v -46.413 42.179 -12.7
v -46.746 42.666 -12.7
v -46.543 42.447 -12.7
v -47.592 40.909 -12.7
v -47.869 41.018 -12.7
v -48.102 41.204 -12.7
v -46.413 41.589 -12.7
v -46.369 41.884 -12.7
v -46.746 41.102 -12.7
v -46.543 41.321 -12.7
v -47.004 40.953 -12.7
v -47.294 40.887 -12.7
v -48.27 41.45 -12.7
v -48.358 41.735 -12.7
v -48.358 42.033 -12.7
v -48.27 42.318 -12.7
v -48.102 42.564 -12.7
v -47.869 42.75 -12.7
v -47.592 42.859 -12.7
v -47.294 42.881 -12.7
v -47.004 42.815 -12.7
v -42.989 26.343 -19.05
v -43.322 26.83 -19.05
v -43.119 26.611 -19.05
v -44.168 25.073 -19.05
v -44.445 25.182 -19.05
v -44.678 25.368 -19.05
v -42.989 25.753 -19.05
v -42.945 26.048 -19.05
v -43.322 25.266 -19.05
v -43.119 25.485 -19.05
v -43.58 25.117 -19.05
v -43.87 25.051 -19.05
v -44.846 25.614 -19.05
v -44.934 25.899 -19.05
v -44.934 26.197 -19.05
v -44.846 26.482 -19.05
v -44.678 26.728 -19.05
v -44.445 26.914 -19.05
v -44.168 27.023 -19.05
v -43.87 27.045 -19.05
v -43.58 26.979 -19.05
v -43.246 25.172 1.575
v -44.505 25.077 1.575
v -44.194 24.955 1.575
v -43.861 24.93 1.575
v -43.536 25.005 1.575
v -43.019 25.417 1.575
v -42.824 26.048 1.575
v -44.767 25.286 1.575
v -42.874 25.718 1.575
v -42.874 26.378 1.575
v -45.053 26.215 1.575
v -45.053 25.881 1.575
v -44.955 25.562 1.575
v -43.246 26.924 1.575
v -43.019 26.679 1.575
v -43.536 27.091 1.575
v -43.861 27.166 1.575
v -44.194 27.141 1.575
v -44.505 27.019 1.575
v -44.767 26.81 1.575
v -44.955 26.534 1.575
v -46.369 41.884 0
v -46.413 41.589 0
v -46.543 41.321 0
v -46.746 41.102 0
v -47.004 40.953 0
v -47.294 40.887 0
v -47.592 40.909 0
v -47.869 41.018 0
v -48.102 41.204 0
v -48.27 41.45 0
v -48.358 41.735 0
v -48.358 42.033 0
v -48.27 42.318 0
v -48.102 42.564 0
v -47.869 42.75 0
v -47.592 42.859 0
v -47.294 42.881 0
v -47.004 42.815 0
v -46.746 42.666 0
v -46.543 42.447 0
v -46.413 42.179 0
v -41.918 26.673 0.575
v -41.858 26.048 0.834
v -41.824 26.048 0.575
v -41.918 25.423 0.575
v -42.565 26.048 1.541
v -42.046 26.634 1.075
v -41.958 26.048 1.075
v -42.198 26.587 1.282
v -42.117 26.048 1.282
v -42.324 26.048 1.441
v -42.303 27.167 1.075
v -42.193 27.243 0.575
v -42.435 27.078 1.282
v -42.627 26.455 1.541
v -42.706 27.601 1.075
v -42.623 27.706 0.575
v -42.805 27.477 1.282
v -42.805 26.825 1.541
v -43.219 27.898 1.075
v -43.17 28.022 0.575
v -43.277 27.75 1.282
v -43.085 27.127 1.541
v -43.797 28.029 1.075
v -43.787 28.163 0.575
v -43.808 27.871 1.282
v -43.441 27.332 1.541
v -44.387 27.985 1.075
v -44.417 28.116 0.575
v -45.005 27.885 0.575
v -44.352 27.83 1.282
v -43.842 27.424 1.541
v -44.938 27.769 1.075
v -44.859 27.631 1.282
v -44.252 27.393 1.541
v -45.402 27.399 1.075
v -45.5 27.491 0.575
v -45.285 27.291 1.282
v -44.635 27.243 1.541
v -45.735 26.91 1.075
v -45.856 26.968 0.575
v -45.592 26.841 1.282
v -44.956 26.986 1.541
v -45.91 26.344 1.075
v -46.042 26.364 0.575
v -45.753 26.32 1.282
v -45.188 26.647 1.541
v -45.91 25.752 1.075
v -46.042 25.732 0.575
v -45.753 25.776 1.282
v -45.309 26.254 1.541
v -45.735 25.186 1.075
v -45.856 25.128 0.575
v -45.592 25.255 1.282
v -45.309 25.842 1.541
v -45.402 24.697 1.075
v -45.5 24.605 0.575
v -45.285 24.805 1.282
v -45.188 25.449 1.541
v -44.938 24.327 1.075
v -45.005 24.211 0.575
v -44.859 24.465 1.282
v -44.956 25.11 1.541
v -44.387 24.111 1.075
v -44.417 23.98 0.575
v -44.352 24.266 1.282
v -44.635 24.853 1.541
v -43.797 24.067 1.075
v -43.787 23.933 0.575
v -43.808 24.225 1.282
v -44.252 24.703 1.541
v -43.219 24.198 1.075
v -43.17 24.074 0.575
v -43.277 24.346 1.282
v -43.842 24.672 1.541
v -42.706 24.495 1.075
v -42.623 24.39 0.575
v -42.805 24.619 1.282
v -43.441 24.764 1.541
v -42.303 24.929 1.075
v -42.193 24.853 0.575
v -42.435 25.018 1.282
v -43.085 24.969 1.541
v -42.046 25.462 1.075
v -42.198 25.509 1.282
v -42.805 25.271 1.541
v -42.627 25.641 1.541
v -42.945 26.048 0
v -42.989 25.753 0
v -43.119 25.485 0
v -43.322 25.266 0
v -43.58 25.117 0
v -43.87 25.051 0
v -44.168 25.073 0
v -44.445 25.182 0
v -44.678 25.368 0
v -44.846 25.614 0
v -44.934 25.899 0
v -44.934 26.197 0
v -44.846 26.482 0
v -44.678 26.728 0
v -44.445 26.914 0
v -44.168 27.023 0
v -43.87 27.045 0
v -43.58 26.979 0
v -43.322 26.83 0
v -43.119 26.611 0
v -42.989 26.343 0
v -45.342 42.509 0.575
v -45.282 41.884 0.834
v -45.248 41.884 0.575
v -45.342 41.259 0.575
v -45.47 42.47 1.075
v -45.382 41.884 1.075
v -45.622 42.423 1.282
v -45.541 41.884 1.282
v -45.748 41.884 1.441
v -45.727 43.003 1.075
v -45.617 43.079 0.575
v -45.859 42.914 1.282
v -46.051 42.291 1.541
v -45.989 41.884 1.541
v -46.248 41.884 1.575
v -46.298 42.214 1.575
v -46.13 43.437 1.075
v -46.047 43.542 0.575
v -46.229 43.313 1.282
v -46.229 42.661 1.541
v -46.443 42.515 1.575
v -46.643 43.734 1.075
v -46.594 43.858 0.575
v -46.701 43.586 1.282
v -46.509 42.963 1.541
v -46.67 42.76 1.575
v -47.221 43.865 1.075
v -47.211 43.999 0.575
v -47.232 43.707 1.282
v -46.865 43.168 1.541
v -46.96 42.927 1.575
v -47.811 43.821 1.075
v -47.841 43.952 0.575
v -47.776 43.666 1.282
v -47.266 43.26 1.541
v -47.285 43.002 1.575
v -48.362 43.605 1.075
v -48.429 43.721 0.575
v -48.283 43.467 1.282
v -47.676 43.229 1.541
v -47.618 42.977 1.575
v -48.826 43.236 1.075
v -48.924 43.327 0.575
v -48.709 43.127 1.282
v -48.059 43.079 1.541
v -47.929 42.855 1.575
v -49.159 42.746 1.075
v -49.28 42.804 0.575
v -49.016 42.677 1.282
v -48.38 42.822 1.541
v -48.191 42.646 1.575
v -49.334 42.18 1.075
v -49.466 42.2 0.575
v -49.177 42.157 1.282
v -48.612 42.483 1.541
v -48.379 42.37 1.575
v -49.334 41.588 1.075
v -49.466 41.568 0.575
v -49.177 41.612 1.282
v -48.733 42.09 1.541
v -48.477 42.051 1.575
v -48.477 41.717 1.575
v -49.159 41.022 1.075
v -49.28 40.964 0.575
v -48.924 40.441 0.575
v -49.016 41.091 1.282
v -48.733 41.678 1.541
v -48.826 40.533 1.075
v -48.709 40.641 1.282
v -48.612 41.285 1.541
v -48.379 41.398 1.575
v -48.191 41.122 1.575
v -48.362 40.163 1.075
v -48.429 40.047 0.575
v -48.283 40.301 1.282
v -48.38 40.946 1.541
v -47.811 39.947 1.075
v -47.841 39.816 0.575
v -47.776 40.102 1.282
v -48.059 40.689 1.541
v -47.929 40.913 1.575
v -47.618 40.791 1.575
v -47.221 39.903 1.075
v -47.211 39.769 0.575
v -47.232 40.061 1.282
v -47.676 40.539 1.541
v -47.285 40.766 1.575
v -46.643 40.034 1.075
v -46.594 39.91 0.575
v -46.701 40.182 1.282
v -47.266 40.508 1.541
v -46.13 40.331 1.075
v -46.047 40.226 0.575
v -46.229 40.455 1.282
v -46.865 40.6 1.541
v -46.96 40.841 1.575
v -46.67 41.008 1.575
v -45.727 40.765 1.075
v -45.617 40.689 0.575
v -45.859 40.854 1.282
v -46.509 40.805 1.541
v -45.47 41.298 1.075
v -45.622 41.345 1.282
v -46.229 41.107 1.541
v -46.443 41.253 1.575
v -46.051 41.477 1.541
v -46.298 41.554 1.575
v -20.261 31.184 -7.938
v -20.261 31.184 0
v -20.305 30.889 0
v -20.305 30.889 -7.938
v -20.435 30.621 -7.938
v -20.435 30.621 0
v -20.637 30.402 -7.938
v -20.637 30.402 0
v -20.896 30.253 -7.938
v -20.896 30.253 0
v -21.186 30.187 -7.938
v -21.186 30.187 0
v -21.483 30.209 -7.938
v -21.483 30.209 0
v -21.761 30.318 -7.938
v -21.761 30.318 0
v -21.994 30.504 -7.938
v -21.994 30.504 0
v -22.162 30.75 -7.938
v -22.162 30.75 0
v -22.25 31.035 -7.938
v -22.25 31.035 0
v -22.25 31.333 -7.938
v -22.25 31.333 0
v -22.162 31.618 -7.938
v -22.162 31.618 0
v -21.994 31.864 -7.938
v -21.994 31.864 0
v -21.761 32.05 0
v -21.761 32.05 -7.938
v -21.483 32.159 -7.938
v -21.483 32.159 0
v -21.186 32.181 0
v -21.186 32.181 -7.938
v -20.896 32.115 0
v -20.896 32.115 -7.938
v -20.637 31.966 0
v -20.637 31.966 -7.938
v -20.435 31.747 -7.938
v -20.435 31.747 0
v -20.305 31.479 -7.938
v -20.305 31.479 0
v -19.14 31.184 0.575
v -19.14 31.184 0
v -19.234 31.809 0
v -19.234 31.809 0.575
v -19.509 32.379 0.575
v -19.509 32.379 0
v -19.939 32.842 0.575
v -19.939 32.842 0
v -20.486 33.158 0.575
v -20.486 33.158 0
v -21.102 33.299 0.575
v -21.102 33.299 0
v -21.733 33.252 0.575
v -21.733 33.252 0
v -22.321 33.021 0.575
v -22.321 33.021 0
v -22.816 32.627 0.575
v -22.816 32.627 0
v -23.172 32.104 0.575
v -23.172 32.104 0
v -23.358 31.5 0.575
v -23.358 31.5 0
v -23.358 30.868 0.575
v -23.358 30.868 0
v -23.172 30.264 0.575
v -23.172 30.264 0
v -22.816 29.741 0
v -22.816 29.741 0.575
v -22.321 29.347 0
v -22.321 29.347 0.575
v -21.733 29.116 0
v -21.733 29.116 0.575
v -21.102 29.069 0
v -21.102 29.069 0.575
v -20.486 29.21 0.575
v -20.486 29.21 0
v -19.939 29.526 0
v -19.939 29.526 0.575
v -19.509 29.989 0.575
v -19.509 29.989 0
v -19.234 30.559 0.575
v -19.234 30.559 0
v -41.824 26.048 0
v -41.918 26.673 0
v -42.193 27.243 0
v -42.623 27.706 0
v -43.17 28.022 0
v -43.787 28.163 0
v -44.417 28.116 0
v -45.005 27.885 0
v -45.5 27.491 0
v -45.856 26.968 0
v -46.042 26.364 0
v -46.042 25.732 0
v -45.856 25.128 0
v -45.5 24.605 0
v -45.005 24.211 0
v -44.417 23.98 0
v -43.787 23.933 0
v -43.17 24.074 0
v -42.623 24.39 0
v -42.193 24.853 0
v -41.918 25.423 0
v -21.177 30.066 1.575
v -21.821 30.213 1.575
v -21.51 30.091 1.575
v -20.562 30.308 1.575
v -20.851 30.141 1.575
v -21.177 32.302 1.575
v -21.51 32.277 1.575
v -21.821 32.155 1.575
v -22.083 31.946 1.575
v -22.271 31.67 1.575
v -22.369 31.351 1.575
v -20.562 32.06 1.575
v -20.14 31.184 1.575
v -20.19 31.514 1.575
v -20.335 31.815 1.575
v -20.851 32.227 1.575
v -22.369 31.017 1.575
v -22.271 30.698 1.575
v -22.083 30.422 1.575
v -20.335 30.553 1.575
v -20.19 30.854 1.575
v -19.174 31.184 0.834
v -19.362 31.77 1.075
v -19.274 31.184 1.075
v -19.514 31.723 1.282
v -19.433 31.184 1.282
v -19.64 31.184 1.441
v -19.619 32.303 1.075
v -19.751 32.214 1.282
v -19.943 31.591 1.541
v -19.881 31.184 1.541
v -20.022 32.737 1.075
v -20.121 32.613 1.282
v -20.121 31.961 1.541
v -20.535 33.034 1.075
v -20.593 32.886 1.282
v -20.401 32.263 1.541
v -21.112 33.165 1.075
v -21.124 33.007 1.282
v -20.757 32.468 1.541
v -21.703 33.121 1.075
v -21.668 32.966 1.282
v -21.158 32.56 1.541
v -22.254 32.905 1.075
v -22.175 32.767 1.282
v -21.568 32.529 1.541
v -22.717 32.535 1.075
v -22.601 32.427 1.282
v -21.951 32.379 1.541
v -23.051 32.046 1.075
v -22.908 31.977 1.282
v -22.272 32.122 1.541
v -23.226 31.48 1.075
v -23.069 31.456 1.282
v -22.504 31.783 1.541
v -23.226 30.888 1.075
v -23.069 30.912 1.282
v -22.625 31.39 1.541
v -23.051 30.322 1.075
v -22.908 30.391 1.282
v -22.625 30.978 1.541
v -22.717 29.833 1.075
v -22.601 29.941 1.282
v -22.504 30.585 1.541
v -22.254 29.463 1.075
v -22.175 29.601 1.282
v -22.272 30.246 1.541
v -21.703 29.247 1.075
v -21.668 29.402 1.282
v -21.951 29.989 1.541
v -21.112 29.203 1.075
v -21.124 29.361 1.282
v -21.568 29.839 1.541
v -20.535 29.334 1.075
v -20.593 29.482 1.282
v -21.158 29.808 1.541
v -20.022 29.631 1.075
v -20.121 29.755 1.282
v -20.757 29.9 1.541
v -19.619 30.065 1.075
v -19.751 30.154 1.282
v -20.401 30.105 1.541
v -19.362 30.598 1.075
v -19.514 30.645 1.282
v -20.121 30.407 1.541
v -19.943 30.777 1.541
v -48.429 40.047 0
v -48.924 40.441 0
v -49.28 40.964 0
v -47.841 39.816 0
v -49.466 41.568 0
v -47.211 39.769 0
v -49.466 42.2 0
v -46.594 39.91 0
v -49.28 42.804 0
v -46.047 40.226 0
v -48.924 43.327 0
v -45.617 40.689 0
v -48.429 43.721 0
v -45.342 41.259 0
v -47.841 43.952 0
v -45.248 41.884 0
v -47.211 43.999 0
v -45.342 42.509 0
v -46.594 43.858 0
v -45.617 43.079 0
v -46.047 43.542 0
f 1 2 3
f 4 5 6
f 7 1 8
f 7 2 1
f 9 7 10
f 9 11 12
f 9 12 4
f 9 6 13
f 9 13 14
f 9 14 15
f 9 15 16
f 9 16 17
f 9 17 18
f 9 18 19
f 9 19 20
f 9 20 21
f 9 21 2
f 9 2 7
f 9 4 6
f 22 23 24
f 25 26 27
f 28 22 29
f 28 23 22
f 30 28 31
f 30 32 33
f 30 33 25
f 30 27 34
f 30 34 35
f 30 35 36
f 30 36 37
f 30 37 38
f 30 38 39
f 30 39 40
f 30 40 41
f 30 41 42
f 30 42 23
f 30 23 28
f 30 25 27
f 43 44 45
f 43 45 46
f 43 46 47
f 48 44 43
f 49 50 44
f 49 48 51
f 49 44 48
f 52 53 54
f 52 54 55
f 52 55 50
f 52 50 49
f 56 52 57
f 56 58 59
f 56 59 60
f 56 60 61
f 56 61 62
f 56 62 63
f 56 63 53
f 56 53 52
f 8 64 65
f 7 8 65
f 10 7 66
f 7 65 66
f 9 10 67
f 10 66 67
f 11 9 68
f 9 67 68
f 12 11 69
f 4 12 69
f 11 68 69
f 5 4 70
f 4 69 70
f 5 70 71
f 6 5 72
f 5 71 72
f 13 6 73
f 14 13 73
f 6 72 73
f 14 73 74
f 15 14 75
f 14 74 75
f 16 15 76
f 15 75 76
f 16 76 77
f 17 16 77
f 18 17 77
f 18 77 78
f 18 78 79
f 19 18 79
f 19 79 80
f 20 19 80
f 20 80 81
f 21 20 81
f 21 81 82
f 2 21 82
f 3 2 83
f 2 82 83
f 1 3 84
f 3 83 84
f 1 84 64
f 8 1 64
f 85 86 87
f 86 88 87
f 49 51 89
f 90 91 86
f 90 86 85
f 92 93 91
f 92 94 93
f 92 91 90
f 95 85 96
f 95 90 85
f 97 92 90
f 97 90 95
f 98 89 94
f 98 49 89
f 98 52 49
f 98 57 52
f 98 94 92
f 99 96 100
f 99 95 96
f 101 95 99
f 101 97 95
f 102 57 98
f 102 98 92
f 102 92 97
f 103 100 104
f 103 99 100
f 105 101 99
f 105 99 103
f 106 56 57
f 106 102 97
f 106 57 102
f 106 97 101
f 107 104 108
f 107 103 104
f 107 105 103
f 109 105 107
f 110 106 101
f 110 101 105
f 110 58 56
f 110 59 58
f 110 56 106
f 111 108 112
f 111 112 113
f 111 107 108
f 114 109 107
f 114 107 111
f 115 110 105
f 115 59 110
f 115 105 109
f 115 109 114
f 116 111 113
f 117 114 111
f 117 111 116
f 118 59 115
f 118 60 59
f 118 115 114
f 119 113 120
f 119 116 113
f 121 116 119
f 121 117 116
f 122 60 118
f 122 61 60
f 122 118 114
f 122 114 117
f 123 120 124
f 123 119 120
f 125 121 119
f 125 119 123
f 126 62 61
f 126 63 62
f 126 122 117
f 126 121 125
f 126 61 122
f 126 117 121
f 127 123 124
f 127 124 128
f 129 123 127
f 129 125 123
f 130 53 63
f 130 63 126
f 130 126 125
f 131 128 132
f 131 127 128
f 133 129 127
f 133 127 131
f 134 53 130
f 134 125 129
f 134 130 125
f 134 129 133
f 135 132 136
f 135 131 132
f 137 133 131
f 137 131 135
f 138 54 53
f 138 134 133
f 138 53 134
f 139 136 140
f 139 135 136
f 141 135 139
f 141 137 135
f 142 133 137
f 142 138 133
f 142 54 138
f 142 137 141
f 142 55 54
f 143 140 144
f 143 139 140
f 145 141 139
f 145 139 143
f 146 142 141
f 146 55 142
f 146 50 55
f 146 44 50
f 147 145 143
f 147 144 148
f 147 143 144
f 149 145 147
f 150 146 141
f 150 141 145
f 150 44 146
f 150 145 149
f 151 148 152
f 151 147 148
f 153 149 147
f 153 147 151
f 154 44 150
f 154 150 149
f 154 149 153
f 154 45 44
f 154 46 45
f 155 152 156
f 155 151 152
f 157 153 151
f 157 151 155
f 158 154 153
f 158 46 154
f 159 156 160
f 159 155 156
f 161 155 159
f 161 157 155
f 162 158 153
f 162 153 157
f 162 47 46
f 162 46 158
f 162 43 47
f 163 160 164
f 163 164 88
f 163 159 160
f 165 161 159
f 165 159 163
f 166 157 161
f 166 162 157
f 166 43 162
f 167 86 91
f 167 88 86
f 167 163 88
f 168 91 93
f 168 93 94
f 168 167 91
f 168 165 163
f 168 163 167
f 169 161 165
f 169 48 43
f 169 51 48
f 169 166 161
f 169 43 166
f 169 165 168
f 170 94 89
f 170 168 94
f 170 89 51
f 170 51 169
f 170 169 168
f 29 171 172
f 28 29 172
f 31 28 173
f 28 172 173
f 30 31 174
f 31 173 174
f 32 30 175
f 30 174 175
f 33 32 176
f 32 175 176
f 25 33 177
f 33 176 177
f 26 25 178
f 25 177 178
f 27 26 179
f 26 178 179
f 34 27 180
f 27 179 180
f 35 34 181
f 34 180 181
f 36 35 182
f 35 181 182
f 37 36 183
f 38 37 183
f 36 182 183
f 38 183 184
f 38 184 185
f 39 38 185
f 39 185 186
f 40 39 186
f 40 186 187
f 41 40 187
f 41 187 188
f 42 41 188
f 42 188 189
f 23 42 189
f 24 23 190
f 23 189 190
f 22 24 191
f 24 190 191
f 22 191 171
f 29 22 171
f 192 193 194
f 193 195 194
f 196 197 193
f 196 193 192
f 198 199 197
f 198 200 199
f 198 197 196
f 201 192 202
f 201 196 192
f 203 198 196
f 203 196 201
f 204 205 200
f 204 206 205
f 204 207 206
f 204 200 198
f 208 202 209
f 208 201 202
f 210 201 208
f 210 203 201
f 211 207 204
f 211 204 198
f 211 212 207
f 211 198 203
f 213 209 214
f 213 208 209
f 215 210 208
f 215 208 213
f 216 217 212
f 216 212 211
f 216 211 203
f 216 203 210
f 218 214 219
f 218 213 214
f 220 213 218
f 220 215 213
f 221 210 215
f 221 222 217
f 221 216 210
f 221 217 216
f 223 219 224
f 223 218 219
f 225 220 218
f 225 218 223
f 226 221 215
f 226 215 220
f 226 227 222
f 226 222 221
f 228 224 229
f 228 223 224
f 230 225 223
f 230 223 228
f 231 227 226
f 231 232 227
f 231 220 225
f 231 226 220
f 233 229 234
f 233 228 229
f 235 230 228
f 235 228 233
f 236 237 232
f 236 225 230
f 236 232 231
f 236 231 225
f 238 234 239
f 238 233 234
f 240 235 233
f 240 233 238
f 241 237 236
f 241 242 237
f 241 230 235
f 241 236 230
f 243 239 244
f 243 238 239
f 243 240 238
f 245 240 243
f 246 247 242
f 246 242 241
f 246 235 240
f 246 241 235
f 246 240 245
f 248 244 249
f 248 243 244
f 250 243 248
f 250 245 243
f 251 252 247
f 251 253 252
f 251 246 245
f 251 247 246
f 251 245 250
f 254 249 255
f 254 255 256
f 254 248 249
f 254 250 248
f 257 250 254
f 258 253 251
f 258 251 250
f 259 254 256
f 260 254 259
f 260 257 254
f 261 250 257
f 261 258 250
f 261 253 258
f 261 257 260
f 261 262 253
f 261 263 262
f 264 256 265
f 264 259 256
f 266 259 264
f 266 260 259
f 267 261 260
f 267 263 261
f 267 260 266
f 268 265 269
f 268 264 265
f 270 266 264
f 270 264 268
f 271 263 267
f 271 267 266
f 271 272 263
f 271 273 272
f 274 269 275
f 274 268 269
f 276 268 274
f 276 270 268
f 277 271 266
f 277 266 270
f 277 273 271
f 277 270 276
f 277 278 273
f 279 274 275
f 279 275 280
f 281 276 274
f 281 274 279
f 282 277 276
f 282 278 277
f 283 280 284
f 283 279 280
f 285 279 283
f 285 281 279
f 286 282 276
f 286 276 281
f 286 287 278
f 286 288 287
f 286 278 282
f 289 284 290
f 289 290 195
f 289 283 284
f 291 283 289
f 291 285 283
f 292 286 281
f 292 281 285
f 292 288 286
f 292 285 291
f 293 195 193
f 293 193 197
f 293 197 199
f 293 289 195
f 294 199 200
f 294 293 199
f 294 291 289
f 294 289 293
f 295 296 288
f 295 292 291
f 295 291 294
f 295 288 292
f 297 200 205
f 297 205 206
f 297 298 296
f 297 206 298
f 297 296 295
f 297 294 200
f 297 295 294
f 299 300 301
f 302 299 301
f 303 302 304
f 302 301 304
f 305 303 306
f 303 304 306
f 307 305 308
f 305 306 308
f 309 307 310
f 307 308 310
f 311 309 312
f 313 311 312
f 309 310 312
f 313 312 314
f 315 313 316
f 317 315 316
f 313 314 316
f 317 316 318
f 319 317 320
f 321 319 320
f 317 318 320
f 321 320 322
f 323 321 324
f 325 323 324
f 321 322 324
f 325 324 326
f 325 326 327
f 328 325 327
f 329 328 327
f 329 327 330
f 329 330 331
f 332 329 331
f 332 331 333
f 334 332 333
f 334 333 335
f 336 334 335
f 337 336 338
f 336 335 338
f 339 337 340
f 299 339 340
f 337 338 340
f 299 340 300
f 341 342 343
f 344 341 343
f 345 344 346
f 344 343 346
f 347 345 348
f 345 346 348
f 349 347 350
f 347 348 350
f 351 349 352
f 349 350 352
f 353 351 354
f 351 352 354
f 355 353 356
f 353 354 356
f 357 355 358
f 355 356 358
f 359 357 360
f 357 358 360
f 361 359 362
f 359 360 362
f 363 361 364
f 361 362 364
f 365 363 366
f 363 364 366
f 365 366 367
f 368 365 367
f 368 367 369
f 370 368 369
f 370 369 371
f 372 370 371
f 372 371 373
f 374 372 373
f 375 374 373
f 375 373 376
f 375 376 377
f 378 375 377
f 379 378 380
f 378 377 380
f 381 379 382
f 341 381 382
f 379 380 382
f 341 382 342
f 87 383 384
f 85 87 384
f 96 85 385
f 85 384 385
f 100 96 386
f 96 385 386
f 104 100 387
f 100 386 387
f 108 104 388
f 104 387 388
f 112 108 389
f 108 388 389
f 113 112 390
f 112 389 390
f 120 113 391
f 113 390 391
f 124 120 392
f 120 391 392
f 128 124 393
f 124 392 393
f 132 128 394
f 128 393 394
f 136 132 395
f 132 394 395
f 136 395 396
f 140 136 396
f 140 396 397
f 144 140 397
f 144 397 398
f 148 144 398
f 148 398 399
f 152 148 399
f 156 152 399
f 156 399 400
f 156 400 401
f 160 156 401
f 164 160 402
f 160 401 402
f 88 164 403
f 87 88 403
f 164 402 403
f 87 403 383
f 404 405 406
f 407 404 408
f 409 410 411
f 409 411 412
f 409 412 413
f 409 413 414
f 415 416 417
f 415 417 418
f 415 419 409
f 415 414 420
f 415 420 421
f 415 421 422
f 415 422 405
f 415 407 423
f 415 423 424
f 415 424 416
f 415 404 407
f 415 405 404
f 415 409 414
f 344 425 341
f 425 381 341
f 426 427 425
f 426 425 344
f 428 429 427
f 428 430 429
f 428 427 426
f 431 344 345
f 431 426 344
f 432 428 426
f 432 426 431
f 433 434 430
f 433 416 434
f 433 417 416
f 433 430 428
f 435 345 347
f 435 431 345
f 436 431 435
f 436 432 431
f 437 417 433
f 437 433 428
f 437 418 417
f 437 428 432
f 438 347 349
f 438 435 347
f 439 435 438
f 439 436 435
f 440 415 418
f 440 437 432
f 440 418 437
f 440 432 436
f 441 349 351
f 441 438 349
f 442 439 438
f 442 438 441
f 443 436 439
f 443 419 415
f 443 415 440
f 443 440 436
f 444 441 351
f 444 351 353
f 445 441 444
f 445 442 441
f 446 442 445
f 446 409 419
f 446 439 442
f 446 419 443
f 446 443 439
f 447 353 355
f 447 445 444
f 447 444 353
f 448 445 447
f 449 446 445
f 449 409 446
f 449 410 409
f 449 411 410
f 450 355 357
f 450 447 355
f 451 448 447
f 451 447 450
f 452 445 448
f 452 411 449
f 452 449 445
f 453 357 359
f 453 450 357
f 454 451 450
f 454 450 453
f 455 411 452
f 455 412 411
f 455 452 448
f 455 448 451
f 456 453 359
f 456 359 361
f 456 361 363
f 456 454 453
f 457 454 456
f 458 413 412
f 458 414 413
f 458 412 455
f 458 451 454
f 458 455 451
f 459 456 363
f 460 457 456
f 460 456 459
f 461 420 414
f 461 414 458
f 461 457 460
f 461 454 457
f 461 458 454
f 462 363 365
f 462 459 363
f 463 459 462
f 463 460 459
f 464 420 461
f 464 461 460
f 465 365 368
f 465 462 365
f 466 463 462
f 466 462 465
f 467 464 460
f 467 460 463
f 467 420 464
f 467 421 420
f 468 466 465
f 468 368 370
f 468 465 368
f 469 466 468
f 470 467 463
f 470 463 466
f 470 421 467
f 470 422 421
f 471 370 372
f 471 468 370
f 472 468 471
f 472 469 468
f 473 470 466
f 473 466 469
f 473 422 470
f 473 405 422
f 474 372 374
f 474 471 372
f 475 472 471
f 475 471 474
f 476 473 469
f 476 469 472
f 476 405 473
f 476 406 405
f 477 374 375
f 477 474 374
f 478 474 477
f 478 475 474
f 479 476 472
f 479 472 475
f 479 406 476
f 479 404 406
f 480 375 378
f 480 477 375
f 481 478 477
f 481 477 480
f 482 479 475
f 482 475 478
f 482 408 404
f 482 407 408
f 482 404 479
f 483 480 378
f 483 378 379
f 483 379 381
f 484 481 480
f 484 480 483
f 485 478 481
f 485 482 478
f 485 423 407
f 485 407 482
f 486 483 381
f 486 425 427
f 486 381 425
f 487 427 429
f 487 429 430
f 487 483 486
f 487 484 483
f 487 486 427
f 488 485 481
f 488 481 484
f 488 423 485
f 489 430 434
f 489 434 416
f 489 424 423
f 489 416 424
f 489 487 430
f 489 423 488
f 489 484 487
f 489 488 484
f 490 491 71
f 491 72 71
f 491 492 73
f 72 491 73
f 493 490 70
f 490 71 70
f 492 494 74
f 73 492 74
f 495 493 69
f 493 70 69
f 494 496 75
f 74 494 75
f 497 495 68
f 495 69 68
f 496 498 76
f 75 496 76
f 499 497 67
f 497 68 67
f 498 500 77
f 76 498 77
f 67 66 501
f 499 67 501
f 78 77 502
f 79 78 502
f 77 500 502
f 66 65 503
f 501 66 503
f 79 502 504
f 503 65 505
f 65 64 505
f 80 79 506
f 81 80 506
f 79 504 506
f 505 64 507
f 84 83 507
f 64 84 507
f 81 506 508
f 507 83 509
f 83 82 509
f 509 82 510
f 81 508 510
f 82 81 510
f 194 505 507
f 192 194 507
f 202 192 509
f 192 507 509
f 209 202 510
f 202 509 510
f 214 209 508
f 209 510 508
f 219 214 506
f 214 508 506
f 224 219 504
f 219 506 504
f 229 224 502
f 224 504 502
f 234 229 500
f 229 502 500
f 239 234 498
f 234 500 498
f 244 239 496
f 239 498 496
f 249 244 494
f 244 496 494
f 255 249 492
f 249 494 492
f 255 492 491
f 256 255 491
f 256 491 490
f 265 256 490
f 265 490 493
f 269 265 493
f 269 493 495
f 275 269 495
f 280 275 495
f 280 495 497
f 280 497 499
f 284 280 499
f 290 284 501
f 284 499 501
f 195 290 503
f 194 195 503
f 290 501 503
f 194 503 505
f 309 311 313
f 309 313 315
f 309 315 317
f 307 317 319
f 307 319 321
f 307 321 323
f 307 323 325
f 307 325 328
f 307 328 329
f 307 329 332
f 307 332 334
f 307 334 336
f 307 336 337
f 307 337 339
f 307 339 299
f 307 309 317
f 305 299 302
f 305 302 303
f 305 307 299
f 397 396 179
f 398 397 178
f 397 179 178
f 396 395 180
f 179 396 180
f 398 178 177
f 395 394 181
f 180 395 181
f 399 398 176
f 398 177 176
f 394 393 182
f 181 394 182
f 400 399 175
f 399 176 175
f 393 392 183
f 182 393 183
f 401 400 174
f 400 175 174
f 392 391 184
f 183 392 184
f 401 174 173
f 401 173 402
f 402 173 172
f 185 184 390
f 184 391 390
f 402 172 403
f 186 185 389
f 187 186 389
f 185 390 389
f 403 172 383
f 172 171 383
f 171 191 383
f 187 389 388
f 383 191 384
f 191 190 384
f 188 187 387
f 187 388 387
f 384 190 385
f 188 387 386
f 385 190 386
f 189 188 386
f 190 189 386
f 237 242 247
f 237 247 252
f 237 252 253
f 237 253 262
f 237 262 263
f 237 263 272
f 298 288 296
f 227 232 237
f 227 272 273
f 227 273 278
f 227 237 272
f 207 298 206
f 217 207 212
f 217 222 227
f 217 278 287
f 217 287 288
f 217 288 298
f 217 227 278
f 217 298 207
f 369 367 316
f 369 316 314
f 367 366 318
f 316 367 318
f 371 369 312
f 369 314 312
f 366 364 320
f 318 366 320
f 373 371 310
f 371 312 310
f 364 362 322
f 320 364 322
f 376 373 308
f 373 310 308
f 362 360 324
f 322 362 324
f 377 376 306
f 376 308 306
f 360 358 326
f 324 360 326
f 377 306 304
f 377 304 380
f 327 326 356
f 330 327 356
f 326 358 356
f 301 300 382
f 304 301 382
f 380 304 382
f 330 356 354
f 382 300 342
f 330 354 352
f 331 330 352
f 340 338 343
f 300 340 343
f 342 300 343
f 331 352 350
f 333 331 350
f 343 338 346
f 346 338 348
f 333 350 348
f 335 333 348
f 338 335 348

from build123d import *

# Parameters (mm, degrees)
F0_R     = 2.1209
F1_DEPTH = 1.5748
F2_R     = 1
F2_2_R   = 1
F2_3_R   = 1
F3_R     = 1
F4_DEPTH = 12.7
F5_R     = 1
F6_DEPTH = 19.05
F7_R     = 1
F8_DEPTH = 7.9375


# Not quite as in the source:
# - a length typed as a fraction of an inch, garbled in the dataset ("3 / 203.2 mm" for 3/8 in), is restored


with BuildPart() as f1:
    # F0 (on Top) → F1 (new body)
    with BuildSketch(Plane.XY):
        with Locations((-47.3690325885, 41.8840522646)):
            Circle(F0_R)
    extrude(amount=F1_DEPTH)

    # F2
    f2_edges = [f1.edges().sort_by_distance(p)[0] for p in [
        (-49.489933, 41.884052, 1.5748),
    ]]
    fillet(f2_edges, radius=F2_R)

    # F3 (on face) → F4 (join)
    with BuildSketch(Plane(origin=(0, 0, 0), x_dir=(1, 0, 0), z_dir=(0, 0, -1))):
        with Locations((-47.3690325885, -41.8840522646)):
            Circle(F3_R)
    extrude(amount=F4_DEPTH)


with BuildPart() as f1b:
    # F0 (on Top) → F1, piece 2 (new body)
    with BuildSketch(Plane.XY):
        with Locations((-43.9450238197, 26.0480039985)):
            Circle(F0_R)
    extrude(amount=F1_DEPTH)

    # F2#2
    f2_2_edges = [f1b.edges().sort_by_distance(p)[0] for p in [
        (-46.065924, 26.048004, 1.5748),
    ]]
    fillet(f2_2_edges, radius=F2_2_R)

    # F5 (on face) → F6 (join)
    with BuildSketch(Plane(origin=(0, 0, 0), x_dir=(1, 0, 0), z_dir=(0, 0, -1))):
        with Locations((-43.9450238197, -26.0480039985)):
            Circle(F5_R)
    extrude(amount=F6_DEPTH)


with BuildPart() as f1c:
    # F0 (on Top) → F1, piece 3 (new body)
    with BuildSketch(Plane.XY):
        with Locations((-21.260954018, 31.1840194363)):
            Circle(F0_R)
    extrude(amount=F1_DEPTH)

    # F2#3
    f2_3_edges = [f1c.edges().sort_by_distance(p)[0] for p in [
        (-23.381854, 31.184019, 1.5748),
    ]]
    fillet(f2_3_edges, radius=F2_3_R)

    # F7 (on face) → F8 (join)
    with BuildSketch(Plane(origin=(0, 0, 0), x_dir=(1, 0, 0), z_dir=(0, 0, -1))):
        with Locations((-21.260954018, -31.1840194363)):
            Circle(F7_R)
    extrude(amount=F8_DEPTH)


solid = Compound([f1.part, f1b.part, f1c.part])
